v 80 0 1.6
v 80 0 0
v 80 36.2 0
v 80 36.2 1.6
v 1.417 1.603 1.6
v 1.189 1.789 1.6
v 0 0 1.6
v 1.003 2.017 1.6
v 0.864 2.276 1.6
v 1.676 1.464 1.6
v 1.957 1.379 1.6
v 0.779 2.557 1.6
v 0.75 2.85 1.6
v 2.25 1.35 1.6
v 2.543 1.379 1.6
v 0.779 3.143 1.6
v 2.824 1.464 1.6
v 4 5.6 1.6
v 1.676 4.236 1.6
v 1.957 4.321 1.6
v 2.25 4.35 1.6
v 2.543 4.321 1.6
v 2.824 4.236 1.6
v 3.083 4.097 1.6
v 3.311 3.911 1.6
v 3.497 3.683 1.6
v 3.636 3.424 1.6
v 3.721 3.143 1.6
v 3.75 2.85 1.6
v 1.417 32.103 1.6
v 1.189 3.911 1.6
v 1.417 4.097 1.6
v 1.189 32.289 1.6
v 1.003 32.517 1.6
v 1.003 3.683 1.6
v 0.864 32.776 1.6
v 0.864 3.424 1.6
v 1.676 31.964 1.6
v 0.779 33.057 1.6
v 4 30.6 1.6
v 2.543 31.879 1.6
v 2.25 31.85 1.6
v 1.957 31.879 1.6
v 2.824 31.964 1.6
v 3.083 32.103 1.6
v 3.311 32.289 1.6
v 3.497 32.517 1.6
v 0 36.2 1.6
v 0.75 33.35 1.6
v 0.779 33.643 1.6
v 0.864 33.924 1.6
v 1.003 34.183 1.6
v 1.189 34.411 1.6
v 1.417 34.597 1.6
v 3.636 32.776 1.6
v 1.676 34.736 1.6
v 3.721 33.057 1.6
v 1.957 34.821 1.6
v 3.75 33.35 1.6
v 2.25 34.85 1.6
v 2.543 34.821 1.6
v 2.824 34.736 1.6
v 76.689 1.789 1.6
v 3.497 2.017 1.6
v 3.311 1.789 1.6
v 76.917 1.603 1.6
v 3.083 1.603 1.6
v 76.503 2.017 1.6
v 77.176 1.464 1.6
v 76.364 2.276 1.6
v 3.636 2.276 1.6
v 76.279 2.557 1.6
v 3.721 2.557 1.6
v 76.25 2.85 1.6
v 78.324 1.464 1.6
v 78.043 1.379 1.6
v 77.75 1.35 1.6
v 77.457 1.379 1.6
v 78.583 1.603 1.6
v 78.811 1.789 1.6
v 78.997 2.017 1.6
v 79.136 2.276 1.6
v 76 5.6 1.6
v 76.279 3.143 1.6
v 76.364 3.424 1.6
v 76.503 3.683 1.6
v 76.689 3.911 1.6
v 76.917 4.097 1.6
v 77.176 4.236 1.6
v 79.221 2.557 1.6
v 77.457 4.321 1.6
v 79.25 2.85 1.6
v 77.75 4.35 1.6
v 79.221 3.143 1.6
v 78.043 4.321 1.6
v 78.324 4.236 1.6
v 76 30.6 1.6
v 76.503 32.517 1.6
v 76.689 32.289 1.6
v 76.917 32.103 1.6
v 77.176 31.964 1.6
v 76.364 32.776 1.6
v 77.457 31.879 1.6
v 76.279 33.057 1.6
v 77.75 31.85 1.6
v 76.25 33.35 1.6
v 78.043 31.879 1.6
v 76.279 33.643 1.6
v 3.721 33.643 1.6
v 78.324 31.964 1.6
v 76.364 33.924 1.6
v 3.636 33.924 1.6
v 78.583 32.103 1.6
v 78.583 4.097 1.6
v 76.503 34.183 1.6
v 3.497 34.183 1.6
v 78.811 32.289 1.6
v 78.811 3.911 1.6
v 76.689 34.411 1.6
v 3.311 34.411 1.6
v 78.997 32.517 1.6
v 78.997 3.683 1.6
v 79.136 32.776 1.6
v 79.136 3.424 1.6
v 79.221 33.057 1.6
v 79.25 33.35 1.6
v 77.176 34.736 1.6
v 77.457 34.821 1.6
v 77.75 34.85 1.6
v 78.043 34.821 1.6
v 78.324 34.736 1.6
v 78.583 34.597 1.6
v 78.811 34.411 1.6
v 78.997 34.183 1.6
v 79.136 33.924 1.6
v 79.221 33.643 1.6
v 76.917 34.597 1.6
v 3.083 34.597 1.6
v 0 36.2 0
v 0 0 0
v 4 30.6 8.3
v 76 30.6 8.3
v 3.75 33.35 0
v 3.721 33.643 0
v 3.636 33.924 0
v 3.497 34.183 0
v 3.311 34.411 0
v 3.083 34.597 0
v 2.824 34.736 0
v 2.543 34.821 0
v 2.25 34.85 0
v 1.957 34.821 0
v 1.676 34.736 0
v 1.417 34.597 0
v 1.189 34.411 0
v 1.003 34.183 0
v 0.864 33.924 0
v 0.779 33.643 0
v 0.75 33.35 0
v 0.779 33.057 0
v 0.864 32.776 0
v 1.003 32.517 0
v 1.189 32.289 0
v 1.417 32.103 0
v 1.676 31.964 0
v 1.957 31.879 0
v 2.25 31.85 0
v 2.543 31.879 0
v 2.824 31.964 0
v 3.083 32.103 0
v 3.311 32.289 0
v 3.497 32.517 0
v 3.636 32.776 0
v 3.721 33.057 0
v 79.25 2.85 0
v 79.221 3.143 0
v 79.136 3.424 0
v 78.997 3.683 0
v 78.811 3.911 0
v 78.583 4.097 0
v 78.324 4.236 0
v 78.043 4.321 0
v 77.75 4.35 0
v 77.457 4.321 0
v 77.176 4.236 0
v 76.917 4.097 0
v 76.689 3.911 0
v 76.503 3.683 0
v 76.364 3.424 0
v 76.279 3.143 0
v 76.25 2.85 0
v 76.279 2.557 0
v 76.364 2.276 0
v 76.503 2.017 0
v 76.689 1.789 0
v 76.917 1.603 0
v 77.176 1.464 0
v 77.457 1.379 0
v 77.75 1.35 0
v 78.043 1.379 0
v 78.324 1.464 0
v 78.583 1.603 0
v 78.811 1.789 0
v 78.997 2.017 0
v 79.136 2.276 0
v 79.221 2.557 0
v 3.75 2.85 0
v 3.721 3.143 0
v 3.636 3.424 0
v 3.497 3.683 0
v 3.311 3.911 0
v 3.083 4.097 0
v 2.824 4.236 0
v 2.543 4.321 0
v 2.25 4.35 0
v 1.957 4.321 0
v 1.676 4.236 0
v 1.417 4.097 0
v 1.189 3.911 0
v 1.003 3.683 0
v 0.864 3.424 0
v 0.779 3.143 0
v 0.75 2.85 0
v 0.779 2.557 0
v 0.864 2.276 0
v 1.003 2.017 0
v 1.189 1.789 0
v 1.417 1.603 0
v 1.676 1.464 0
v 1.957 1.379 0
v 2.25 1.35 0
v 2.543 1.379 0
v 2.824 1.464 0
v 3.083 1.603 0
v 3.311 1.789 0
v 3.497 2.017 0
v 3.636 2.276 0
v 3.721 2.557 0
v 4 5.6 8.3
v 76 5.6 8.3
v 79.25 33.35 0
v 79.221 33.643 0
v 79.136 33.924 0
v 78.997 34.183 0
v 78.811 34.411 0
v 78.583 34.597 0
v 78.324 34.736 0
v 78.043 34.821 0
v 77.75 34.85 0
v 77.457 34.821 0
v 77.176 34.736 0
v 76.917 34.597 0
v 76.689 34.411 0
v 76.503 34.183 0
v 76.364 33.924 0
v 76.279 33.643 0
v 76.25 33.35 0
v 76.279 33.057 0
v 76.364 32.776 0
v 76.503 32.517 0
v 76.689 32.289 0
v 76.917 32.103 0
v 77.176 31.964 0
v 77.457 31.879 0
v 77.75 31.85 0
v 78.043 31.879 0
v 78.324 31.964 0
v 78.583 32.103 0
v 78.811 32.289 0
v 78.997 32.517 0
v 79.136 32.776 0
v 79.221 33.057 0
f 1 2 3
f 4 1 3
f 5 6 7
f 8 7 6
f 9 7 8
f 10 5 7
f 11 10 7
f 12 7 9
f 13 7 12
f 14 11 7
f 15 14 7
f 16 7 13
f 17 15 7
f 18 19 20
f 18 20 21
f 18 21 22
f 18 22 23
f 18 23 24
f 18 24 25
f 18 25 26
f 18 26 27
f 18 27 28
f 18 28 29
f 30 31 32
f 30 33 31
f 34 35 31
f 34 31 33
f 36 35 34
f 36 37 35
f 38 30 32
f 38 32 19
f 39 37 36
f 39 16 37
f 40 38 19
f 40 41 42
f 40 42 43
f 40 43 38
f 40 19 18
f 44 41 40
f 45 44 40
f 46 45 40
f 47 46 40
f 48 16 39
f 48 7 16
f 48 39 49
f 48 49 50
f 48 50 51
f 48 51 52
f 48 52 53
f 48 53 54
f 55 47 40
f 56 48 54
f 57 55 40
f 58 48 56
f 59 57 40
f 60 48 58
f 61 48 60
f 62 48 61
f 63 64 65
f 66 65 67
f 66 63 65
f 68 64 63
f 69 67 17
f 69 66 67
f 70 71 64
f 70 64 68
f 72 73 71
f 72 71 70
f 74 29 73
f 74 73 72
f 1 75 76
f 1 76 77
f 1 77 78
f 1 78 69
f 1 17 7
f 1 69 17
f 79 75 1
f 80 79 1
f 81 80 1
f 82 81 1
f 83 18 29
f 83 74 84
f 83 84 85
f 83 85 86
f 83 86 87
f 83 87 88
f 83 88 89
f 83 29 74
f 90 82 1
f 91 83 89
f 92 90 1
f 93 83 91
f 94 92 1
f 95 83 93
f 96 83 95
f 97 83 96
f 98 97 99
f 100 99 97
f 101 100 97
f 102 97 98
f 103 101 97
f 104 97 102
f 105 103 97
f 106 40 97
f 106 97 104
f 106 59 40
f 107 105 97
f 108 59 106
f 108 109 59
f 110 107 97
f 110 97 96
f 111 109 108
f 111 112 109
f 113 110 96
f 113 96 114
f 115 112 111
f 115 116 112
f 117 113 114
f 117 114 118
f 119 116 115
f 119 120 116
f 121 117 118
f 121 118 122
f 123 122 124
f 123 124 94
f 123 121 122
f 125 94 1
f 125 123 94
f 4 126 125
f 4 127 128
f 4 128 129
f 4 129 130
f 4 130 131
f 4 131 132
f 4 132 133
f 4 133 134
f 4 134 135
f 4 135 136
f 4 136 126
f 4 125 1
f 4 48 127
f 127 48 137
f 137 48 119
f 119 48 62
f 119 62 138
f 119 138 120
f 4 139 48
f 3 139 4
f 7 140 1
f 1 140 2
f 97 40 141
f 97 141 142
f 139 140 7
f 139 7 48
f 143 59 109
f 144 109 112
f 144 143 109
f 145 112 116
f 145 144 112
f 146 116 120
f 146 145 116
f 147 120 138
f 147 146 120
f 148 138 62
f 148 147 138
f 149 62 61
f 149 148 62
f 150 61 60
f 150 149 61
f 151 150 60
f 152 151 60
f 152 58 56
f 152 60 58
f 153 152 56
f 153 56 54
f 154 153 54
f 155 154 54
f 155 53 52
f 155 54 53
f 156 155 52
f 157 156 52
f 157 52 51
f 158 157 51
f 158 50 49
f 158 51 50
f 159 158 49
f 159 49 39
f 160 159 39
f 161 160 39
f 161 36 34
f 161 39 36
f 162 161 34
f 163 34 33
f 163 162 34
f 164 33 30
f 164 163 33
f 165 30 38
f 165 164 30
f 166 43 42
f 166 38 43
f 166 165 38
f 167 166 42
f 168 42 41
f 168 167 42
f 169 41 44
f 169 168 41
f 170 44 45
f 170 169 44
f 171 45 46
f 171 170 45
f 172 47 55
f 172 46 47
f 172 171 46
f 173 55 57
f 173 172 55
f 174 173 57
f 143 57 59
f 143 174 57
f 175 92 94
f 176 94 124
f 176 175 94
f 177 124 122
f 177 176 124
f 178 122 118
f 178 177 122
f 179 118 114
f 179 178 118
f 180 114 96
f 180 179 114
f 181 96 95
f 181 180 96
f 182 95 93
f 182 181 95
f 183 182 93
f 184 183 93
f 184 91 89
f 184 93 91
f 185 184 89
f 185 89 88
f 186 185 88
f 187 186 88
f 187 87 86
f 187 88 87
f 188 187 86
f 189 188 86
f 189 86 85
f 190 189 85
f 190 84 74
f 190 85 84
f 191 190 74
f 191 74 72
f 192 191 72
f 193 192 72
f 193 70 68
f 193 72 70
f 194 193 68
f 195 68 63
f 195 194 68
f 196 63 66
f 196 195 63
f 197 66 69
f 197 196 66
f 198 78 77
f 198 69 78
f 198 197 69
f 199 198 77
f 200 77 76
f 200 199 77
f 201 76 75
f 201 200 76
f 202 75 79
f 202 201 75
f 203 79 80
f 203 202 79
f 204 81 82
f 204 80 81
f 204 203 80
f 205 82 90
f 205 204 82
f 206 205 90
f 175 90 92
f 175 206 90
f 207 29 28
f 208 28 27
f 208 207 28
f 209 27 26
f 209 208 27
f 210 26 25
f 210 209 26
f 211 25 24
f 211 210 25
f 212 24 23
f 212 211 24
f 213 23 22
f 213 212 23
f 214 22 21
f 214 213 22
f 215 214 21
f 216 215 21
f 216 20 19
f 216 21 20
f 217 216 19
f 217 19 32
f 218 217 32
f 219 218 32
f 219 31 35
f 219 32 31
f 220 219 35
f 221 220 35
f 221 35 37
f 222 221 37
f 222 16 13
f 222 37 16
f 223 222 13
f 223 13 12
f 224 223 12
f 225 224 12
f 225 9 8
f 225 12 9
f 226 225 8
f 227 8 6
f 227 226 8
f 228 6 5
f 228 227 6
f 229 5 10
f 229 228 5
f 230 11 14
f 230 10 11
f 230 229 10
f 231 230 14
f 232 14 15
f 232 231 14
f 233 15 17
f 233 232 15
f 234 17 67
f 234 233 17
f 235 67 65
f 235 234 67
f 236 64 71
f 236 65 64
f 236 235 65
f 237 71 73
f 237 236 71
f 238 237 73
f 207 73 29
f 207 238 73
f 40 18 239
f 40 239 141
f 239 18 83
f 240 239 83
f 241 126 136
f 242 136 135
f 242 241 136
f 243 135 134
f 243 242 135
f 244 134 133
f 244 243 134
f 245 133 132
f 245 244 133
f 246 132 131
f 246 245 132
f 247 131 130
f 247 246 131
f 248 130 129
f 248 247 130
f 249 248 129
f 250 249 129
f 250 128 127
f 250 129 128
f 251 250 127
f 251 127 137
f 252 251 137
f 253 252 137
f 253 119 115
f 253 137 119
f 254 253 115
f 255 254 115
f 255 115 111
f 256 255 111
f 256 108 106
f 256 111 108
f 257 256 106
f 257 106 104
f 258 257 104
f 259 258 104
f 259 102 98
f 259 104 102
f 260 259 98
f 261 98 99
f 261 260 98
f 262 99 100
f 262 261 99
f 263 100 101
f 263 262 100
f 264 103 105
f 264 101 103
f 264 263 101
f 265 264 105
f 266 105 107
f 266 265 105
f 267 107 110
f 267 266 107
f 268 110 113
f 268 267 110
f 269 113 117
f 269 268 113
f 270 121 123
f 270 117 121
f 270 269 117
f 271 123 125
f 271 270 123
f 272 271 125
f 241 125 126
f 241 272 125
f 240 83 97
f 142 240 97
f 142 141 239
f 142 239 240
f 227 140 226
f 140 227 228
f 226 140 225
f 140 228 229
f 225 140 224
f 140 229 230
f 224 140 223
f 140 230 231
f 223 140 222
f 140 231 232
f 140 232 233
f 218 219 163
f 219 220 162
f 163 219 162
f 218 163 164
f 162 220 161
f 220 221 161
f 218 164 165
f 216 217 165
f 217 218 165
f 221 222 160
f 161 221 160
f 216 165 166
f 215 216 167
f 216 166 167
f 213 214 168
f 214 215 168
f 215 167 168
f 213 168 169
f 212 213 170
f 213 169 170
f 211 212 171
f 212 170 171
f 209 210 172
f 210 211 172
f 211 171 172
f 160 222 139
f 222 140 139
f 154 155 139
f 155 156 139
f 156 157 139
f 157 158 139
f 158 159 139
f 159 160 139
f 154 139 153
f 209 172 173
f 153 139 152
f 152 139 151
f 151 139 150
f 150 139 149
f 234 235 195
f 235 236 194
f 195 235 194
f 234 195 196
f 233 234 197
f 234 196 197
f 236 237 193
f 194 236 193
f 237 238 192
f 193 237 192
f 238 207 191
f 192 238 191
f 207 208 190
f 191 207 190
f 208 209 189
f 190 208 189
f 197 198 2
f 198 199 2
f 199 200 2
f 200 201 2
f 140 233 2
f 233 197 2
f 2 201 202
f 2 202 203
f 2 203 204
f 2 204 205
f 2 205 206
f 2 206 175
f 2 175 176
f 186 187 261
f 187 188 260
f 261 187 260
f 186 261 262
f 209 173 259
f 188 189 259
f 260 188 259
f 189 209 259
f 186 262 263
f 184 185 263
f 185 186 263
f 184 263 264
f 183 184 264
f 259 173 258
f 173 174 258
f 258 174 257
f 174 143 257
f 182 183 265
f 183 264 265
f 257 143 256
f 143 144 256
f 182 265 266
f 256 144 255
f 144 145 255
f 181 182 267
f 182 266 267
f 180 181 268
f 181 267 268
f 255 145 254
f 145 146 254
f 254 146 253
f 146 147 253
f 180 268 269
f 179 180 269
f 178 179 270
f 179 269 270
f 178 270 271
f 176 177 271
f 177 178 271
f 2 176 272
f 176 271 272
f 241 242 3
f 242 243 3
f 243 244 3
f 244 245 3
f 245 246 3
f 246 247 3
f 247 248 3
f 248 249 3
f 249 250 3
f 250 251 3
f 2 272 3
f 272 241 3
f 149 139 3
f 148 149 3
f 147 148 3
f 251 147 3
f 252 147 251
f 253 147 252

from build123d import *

# Parameters (mm, degrees)
BOX004_W        = 80
BOX004_H        = 36.2
BOX004_DEPTH    = 1.6
BOX005_W        = 72
BOX005_H        = 25
BOX005_DEPTH    = 6.7
SKETCH019_R     = 1.5
POCKET002_DEPTH = 5


with BuildPart() as part:
    # Box004 → Box004 (join)
    with BuildSketch(Plane.XY):
        with Locations((40, 18.1)):
            Rectangle(BOX004_W, BOX004_H)
    extrude(amount=BOX004_DEPTH)

    # Box005 → Box005 (join)
    with BuildSketch(Plane(origin=(4, 5.6, 1.6), x_dir=(1, 0, 0), z_dir=(0, 0, 1))):
        with Locations((36, 12.5)):
            Rectangle(BOX005_W, BOX005_H)
    extrude(amount=BOX005_DEPTH)

    # Sketch019 → Pocket002 (cut)
    with BuildSketch(Plane.XY):
        with Locations((2.25, 33.35)):
            Circle(SKETCH019_R)
        with Locations((77.75, 33.35)):
            Circle(SKETCH019_R)
        with Locations((77.75, 2.85)):
            Circle(SKETCH019_R)
        with Locations((2.25, 2.85)):
            Circle(SKETCH019_R)
    extrude(amount=POCKET002_DEPTH, mode=Mode.SUBTRACT)


solid = part.part
